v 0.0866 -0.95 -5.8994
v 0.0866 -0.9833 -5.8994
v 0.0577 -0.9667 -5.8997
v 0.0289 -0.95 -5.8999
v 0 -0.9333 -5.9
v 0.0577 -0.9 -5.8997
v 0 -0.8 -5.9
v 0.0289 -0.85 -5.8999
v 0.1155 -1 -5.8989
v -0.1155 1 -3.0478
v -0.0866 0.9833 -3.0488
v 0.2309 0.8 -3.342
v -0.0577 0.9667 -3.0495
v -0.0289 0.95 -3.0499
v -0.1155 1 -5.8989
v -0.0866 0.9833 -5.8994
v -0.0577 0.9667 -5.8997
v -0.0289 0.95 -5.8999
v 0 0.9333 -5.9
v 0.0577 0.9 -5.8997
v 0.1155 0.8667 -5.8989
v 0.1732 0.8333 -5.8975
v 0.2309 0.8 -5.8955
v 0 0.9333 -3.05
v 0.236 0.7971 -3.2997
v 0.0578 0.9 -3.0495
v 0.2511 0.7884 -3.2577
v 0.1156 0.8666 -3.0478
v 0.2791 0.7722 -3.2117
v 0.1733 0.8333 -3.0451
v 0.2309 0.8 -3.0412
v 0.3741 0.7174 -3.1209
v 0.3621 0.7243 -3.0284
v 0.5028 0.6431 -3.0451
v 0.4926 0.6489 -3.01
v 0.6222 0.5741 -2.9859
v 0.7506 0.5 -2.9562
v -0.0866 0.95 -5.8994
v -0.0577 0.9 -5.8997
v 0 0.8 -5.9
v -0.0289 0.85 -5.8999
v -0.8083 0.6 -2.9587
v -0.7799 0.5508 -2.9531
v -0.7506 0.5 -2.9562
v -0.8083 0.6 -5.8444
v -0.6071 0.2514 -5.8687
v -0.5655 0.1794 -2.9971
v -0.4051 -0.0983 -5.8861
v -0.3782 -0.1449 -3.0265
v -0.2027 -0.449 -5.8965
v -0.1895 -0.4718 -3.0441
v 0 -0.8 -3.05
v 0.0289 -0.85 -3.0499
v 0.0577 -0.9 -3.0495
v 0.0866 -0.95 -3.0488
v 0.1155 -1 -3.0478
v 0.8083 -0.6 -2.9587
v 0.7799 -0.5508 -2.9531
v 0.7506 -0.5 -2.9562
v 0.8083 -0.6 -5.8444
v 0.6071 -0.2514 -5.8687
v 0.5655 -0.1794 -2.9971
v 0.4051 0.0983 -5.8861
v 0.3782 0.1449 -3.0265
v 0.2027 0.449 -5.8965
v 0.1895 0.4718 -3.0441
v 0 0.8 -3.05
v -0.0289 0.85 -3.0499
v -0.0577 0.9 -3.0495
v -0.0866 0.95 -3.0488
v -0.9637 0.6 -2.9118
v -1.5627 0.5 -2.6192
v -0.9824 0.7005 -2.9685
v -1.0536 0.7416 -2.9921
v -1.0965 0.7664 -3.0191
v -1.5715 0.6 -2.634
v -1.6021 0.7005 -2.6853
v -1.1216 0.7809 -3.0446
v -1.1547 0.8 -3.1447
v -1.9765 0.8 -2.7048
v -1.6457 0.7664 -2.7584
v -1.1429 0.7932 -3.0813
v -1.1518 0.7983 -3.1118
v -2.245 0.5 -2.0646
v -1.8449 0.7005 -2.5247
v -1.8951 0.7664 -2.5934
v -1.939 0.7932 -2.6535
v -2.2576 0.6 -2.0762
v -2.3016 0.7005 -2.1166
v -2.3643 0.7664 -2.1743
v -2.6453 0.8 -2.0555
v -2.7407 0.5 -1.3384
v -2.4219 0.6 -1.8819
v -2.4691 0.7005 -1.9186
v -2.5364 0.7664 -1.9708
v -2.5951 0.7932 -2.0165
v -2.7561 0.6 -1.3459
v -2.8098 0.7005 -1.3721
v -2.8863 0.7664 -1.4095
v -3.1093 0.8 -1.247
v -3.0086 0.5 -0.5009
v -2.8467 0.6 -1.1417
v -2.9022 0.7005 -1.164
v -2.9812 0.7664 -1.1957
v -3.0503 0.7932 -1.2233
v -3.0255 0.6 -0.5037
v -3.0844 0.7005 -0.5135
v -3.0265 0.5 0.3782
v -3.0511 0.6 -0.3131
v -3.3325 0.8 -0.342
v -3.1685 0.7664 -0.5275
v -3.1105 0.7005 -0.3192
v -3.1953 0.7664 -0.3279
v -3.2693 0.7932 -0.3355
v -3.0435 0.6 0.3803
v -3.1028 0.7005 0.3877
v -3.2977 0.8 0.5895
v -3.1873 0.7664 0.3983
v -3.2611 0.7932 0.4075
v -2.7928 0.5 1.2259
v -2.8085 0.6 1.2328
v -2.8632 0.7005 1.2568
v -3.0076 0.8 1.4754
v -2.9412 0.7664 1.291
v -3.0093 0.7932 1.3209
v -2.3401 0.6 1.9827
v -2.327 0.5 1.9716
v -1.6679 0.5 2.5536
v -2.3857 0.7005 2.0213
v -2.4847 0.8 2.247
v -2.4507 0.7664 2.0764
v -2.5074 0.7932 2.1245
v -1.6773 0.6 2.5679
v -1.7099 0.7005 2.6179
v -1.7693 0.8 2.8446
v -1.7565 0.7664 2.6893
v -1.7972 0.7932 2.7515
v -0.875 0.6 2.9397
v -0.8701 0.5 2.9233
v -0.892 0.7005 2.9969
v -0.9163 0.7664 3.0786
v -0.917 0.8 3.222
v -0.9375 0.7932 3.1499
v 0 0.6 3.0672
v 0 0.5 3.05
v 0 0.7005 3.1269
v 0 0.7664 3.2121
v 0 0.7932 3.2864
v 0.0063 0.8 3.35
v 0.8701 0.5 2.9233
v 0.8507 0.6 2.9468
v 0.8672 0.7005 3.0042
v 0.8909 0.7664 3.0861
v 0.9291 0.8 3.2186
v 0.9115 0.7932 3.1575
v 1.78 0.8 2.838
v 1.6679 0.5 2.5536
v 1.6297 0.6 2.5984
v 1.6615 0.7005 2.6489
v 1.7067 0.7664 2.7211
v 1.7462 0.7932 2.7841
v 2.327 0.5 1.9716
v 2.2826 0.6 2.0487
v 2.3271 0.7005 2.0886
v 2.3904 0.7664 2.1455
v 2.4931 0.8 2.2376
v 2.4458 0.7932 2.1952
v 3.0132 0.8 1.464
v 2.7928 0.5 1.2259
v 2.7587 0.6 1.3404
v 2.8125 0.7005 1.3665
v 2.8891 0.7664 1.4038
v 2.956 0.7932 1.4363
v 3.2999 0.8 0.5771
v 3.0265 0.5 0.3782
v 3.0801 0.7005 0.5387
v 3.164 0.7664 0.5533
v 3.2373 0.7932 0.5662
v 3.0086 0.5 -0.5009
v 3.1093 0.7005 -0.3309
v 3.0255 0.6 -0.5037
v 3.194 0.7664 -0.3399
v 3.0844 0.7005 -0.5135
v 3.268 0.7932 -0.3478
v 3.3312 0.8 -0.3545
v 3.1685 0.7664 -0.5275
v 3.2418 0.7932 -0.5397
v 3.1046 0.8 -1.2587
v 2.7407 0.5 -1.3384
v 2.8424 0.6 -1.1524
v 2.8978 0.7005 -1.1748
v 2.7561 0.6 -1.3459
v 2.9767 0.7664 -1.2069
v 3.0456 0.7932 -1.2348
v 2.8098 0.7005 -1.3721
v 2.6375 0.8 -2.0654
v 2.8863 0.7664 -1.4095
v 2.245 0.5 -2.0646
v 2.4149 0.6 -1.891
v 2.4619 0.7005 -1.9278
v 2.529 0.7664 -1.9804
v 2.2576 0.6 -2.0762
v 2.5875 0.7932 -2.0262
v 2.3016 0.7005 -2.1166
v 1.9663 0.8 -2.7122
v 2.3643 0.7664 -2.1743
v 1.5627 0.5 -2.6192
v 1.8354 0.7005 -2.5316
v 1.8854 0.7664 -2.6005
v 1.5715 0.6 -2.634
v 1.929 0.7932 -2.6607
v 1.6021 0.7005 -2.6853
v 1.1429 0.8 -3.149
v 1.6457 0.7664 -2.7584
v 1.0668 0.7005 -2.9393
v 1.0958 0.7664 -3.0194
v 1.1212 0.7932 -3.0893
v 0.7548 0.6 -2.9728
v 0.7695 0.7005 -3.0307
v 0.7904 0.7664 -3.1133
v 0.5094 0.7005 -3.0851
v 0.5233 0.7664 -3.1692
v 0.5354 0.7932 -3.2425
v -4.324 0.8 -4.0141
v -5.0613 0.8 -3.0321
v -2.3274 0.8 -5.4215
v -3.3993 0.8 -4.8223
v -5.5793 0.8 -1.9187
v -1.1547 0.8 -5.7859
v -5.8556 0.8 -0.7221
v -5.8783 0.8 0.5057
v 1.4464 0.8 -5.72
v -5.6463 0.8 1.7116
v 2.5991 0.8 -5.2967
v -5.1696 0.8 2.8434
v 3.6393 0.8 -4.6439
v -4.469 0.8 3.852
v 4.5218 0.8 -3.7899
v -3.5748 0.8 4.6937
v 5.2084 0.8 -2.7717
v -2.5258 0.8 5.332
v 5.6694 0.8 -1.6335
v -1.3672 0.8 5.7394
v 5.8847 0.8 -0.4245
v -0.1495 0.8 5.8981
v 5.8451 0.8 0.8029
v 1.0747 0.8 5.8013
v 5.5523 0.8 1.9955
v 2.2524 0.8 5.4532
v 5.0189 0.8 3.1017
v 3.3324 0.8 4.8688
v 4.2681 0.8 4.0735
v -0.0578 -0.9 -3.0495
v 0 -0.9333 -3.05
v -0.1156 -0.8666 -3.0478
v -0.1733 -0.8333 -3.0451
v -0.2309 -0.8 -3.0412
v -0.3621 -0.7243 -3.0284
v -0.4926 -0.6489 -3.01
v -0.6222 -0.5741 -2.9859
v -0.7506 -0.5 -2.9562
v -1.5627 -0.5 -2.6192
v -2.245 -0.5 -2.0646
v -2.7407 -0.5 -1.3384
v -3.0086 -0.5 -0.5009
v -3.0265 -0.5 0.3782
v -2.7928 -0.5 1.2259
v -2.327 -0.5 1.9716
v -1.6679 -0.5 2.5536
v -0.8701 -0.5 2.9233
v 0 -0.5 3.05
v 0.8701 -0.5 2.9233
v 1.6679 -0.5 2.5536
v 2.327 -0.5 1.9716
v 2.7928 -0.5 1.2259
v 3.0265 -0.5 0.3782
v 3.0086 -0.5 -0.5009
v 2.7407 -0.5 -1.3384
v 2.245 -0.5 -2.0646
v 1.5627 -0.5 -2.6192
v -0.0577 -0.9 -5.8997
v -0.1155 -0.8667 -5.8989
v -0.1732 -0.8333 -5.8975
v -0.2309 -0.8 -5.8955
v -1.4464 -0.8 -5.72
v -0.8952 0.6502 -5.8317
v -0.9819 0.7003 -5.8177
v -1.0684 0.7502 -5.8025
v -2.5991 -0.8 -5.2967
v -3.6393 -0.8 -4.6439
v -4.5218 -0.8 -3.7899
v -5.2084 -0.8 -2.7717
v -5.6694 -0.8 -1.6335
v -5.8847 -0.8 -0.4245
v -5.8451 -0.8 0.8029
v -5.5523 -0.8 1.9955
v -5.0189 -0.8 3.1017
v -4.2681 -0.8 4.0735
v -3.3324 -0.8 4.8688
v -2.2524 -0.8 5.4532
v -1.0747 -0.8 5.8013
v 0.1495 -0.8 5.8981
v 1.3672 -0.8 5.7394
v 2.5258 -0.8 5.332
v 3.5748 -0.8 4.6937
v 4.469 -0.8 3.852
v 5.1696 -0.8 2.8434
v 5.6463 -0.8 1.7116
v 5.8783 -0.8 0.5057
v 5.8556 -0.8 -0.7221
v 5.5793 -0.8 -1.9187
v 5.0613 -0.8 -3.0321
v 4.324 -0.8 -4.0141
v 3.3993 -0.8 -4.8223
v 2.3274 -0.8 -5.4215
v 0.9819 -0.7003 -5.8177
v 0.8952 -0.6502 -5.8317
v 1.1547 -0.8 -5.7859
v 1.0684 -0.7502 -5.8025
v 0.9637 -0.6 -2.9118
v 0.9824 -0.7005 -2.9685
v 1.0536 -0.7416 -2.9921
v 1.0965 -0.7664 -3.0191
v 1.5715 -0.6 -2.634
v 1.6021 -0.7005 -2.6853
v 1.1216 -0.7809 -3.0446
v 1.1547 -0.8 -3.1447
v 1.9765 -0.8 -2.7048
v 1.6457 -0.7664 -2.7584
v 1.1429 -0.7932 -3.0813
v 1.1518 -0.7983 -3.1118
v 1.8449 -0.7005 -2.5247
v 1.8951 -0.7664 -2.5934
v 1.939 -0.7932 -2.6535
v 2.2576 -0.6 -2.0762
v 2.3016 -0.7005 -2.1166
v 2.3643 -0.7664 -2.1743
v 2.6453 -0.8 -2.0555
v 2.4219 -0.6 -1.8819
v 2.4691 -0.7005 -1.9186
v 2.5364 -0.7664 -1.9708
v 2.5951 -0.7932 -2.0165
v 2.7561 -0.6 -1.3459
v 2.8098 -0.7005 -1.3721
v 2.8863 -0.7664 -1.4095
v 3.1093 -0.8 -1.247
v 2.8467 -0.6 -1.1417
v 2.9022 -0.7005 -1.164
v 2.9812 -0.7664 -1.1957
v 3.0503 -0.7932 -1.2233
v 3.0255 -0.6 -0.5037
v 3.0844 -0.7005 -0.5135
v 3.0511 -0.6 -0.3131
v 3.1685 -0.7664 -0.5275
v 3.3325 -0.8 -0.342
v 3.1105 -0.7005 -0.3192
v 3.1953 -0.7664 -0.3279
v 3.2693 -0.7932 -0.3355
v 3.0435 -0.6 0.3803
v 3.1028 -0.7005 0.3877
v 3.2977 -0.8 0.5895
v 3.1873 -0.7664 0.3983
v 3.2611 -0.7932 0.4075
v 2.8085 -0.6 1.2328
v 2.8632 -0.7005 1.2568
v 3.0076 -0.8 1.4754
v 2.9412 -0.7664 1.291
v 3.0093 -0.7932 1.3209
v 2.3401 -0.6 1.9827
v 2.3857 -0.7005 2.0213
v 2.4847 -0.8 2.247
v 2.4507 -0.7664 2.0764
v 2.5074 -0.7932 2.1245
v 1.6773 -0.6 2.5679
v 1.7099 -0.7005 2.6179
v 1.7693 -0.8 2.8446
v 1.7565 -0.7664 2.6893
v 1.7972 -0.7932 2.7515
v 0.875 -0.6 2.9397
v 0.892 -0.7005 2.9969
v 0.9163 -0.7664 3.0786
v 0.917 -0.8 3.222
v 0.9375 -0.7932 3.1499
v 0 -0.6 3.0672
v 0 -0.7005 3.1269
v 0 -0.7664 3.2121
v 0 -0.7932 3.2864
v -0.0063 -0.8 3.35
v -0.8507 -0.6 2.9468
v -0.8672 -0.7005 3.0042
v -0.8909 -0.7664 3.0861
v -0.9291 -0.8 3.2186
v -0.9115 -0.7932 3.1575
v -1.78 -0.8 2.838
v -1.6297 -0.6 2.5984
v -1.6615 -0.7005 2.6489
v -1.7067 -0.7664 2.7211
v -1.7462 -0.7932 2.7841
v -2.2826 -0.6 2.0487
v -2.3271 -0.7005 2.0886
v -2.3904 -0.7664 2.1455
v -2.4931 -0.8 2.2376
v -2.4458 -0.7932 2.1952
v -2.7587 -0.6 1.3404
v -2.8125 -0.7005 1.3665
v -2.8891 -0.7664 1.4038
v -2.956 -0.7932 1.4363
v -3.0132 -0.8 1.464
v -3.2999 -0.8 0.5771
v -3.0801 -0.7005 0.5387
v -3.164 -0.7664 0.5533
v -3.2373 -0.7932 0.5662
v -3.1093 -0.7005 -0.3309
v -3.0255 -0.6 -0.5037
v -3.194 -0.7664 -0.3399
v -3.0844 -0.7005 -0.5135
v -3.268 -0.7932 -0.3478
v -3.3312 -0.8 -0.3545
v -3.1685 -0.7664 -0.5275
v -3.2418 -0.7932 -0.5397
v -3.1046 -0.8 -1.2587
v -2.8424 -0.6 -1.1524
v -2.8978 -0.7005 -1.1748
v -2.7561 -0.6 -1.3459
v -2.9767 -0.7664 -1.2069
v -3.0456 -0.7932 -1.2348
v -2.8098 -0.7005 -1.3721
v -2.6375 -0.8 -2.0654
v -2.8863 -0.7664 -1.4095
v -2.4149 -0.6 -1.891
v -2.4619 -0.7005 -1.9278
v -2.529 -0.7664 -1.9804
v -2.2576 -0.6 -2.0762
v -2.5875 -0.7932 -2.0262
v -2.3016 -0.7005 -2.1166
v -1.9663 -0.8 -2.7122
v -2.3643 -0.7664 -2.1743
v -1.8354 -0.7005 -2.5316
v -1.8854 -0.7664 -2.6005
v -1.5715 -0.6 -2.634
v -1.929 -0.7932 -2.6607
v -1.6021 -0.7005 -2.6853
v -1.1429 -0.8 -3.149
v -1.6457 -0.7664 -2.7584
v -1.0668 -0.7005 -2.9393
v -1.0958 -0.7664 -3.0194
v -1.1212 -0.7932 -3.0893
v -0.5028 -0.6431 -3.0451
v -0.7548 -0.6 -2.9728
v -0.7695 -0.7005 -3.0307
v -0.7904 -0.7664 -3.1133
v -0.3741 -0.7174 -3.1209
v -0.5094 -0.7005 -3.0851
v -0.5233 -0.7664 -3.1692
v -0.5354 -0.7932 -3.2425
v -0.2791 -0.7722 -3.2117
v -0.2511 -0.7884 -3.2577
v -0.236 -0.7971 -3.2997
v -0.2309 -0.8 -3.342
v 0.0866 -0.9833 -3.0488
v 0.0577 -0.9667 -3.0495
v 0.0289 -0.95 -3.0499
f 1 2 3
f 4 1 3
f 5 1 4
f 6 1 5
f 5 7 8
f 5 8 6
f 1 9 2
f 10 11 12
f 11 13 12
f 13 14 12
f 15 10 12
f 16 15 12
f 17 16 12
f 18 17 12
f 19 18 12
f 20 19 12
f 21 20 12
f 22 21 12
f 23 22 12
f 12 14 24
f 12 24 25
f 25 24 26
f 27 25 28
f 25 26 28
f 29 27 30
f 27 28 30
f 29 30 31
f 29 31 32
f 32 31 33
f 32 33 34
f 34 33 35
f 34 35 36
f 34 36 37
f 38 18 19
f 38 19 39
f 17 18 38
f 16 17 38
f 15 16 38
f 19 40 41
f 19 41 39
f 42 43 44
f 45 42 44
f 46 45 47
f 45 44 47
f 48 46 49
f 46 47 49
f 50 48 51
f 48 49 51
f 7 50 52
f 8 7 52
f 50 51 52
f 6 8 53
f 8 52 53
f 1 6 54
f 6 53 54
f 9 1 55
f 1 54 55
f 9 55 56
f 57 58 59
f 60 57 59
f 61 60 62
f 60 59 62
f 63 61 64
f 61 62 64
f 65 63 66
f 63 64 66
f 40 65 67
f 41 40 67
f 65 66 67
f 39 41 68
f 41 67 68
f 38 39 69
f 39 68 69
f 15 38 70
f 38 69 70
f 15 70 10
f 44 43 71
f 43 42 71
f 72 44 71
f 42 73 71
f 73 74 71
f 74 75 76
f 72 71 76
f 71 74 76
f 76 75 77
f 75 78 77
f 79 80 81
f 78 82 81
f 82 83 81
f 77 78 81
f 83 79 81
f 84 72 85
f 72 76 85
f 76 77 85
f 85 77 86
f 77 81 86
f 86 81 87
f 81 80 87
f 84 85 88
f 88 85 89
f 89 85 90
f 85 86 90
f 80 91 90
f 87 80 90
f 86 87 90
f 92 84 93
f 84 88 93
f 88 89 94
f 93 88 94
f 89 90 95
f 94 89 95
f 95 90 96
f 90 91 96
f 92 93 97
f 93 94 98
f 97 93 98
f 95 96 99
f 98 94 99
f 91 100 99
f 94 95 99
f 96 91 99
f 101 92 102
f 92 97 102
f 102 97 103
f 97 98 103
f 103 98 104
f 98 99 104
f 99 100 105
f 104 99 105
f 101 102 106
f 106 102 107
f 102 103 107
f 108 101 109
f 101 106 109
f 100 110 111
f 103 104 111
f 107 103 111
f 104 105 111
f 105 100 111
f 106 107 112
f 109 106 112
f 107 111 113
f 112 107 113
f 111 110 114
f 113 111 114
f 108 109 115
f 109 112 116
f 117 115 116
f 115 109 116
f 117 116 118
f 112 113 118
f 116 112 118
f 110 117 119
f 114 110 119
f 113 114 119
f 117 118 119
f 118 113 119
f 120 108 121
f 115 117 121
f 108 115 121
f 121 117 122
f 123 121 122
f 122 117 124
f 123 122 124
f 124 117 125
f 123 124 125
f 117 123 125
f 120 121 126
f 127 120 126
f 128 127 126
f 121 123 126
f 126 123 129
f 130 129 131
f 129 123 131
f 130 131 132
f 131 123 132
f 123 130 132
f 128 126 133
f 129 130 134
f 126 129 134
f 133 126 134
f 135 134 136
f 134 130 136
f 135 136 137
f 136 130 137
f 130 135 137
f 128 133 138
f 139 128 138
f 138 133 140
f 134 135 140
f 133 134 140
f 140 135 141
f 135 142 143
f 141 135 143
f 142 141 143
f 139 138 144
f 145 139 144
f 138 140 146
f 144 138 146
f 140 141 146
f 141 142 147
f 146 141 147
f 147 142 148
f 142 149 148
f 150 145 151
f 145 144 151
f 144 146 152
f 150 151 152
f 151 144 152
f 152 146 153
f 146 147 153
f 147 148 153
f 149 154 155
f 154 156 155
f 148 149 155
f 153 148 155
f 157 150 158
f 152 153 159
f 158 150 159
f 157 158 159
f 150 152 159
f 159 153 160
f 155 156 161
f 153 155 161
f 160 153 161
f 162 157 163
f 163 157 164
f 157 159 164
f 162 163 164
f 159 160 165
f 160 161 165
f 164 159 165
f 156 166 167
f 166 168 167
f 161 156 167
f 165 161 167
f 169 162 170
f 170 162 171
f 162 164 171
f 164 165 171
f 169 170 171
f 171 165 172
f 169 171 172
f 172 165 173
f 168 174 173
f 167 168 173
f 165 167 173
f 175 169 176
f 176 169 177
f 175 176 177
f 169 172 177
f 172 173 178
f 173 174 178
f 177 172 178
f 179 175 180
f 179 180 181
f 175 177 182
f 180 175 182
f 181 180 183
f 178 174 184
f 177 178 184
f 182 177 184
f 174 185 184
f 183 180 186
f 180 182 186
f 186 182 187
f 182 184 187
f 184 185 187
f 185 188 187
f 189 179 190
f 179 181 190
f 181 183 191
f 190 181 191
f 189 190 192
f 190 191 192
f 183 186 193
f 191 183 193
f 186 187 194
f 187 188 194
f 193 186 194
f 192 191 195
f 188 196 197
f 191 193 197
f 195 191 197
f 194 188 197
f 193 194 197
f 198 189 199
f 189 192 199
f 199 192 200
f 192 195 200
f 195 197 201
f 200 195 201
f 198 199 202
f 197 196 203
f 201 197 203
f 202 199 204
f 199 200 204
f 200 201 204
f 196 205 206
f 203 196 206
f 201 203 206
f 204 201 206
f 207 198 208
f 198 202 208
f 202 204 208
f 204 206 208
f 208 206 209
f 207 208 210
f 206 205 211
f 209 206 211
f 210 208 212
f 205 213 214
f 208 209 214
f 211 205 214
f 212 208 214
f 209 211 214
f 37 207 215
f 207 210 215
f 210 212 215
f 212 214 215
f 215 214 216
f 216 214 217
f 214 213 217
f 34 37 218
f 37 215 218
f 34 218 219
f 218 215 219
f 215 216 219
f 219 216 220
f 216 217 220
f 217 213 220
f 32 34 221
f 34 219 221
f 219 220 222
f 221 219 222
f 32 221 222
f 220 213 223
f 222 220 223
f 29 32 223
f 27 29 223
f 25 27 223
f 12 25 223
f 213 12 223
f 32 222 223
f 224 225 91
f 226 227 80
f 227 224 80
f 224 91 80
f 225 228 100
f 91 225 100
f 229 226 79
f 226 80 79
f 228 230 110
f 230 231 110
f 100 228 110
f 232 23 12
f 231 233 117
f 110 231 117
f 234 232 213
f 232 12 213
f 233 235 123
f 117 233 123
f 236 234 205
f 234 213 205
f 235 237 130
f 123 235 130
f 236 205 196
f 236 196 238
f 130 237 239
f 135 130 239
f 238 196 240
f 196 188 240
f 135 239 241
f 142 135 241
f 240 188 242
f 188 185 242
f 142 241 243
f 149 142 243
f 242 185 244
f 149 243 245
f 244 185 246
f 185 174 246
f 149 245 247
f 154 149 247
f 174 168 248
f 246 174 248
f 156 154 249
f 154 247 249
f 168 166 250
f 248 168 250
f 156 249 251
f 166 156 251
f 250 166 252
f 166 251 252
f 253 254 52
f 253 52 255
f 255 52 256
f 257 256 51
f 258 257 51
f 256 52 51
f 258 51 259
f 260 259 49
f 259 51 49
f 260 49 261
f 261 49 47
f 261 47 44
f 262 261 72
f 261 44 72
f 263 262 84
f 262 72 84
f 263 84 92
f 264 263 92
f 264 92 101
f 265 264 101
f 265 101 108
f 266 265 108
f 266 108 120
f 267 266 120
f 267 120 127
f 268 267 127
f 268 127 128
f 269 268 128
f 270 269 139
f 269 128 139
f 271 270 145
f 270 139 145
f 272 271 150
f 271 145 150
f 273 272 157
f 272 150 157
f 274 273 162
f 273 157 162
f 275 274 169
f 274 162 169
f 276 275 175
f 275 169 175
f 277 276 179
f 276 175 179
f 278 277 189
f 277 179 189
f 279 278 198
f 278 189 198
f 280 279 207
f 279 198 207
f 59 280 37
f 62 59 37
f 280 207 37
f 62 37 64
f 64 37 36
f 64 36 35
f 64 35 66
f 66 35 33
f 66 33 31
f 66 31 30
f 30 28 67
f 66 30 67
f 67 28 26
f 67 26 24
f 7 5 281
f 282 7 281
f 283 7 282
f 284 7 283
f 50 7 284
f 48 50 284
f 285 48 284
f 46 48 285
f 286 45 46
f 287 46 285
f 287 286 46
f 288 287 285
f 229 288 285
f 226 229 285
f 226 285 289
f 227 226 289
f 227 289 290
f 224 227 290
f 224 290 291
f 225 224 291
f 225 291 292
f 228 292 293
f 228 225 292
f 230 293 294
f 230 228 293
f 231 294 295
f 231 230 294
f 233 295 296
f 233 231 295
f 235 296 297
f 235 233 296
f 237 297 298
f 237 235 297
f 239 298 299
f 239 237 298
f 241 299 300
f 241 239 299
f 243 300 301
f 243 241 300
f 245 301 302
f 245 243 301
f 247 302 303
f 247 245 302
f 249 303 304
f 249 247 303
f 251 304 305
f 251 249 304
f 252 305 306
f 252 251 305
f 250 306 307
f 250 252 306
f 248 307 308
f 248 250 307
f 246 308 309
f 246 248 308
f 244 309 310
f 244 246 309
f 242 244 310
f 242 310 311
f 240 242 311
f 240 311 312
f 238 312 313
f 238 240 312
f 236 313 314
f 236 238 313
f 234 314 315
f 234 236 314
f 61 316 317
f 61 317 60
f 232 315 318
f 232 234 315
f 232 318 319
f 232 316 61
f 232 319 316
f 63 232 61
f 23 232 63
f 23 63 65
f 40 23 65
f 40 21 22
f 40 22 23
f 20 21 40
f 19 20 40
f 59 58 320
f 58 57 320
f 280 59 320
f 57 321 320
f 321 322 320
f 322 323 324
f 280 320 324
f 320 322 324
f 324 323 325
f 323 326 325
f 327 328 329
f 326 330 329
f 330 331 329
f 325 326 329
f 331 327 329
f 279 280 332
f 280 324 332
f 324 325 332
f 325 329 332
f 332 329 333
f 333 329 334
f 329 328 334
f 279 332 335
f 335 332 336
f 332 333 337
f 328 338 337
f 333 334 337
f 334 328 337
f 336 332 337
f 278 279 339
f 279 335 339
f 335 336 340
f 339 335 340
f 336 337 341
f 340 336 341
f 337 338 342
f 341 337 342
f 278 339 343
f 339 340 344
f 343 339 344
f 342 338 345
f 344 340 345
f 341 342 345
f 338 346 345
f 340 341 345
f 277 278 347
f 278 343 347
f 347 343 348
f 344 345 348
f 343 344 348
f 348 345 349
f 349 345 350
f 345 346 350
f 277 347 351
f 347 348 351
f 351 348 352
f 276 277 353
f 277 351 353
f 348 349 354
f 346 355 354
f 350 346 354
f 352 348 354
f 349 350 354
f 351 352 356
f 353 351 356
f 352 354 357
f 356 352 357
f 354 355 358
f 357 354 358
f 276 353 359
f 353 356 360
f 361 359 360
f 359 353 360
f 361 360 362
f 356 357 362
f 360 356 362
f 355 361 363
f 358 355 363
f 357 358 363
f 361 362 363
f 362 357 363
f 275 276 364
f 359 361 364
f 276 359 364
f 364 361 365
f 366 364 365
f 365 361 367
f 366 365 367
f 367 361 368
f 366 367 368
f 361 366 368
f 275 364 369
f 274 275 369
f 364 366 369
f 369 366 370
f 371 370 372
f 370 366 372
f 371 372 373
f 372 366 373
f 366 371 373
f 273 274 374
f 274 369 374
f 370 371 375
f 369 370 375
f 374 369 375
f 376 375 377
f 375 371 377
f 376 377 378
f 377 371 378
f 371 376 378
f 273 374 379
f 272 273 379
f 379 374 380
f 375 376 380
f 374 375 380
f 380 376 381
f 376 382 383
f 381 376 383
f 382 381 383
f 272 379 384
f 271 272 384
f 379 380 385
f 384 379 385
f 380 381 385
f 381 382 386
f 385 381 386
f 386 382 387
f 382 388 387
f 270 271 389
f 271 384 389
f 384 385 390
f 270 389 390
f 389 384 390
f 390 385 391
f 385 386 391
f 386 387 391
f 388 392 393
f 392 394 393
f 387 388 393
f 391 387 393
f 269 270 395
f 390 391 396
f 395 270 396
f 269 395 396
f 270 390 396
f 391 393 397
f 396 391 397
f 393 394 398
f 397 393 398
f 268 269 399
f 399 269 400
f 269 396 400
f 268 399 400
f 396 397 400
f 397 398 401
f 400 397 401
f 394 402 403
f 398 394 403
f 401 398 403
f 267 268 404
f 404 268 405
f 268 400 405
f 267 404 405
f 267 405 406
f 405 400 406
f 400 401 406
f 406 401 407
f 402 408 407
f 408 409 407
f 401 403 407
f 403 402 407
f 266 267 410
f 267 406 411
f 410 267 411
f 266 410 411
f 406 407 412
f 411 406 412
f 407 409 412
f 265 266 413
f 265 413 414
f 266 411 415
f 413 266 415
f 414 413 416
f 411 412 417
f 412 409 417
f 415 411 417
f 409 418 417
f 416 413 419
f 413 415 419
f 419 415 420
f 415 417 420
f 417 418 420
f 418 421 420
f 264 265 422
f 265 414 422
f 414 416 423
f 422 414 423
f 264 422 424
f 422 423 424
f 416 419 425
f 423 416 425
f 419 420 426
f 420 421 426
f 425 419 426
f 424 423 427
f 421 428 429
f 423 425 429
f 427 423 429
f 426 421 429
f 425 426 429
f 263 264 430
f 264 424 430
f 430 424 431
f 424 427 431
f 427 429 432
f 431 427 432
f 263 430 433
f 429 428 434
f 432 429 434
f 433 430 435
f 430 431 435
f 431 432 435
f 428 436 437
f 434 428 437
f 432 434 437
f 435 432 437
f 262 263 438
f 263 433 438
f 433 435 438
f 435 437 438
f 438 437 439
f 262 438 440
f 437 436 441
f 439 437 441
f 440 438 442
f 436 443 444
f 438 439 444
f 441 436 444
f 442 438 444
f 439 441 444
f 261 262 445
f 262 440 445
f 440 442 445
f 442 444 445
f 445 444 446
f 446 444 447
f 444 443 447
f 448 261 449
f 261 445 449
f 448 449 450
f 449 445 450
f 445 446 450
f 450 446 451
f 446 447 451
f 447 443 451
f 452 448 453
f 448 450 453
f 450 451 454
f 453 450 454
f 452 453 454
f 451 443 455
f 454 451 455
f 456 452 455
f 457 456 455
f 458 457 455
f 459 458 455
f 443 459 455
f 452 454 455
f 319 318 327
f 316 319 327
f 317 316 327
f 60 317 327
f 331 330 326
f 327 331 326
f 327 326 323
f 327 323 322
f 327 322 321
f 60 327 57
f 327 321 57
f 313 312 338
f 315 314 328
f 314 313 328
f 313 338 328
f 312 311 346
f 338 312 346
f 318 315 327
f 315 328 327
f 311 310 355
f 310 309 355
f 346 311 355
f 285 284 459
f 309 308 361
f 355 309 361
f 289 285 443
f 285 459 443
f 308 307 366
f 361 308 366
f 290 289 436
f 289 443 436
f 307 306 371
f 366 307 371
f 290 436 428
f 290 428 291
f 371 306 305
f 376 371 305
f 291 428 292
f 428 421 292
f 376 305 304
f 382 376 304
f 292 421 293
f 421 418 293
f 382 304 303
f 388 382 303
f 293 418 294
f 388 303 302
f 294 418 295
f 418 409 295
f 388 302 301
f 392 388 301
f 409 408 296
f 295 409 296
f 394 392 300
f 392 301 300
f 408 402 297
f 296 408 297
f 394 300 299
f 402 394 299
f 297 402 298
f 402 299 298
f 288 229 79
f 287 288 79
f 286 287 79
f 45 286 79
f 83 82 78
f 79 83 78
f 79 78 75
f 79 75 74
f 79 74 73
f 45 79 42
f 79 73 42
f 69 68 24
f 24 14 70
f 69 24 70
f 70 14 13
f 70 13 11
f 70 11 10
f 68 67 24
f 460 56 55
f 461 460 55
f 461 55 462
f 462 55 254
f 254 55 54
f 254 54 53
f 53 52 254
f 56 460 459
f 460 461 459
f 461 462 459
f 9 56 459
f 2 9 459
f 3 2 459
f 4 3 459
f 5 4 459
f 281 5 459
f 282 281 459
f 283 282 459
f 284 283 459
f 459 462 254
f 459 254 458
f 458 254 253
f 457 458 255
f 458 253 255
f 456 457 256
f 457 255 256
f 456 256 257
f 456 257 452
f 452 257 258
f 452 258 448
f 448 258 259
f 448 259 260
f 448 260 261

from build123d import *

# Parameters (mm, degrees)
BODYSKE_W       = 2.85
BODYSKE_H       = 20
CUT_EXTRASKE_W  = 11.8
CUT_EXTRASKE_H  = 9.2
CUT_EXTRA_DEPTH = 14.023824323
TYPE_A_DEPTH    = 14.023824323
FILLET1_R       = 0.3


with BuildPart() as part:
    # BodySke → BaseBody (revolve)
    with BuildSketch(Plane.XY, mode=Mode.PRIVATE) as basebody_sk:
        with Locations((4.475, 0)):
            Rectangle(BODYSKE_W, BODYSKE_H)
    revolve(basebody_sk.sketch.rotate(Axis((0, 0, 0), (0, 1, 0)), 90), axis=Axis((0, 0, 0), (0, 1, 0)))

    # Cut-ExtraSke → Cut-Extra (cut, through all)
    with BuildSketch(Plane.XY):
        with Locations((0, -5.4)):
            Rectangle(CUT_EXTRASKE_W, CUT_EXTRASKE_H)
        with Locations((0, 5.4)):
            Rectangle(CUT_EXTRASKE_W, CUT_EXTRASKE_H)
    extrude(amount=CUT_EXTRA_DEPTH, mode=Mode.SUBTRACT)

    # ASke → Type-A (cut, through all)
    with BuildSketch(Plane.XY):
        Polygon((0.115470054, -1), (-0.230940108, -0.8), (-5.9, -0.8), (-5.9, -10), (5.9, -10), (5.9, -0.8), (1.154700538, -0.8), (0.808290377, -0.6), (-0.115470054, 1), (0.230940108, 0.8), (5.9, 0.8), (5.9, 10), (-5.9, 10), (-5.9, 0.8), (-1.154700538, 0.8), (-0.808290377, 0.6), align=None)
    extrude(amount=-TYPE_A_DEPTH, mode=Mode.SUBTRACT)

    # Fillet1
    fillet1_edges = [part.edges().sort_by_distance(p)[0] for p in [
        (-0.474598894, -0.8, 3.012848468),
        (0.474598894, 0.8, 3.012848468),
    ]]
    fillet(fillet1_edges, radius=FILLET1_R)


solid = part.part
